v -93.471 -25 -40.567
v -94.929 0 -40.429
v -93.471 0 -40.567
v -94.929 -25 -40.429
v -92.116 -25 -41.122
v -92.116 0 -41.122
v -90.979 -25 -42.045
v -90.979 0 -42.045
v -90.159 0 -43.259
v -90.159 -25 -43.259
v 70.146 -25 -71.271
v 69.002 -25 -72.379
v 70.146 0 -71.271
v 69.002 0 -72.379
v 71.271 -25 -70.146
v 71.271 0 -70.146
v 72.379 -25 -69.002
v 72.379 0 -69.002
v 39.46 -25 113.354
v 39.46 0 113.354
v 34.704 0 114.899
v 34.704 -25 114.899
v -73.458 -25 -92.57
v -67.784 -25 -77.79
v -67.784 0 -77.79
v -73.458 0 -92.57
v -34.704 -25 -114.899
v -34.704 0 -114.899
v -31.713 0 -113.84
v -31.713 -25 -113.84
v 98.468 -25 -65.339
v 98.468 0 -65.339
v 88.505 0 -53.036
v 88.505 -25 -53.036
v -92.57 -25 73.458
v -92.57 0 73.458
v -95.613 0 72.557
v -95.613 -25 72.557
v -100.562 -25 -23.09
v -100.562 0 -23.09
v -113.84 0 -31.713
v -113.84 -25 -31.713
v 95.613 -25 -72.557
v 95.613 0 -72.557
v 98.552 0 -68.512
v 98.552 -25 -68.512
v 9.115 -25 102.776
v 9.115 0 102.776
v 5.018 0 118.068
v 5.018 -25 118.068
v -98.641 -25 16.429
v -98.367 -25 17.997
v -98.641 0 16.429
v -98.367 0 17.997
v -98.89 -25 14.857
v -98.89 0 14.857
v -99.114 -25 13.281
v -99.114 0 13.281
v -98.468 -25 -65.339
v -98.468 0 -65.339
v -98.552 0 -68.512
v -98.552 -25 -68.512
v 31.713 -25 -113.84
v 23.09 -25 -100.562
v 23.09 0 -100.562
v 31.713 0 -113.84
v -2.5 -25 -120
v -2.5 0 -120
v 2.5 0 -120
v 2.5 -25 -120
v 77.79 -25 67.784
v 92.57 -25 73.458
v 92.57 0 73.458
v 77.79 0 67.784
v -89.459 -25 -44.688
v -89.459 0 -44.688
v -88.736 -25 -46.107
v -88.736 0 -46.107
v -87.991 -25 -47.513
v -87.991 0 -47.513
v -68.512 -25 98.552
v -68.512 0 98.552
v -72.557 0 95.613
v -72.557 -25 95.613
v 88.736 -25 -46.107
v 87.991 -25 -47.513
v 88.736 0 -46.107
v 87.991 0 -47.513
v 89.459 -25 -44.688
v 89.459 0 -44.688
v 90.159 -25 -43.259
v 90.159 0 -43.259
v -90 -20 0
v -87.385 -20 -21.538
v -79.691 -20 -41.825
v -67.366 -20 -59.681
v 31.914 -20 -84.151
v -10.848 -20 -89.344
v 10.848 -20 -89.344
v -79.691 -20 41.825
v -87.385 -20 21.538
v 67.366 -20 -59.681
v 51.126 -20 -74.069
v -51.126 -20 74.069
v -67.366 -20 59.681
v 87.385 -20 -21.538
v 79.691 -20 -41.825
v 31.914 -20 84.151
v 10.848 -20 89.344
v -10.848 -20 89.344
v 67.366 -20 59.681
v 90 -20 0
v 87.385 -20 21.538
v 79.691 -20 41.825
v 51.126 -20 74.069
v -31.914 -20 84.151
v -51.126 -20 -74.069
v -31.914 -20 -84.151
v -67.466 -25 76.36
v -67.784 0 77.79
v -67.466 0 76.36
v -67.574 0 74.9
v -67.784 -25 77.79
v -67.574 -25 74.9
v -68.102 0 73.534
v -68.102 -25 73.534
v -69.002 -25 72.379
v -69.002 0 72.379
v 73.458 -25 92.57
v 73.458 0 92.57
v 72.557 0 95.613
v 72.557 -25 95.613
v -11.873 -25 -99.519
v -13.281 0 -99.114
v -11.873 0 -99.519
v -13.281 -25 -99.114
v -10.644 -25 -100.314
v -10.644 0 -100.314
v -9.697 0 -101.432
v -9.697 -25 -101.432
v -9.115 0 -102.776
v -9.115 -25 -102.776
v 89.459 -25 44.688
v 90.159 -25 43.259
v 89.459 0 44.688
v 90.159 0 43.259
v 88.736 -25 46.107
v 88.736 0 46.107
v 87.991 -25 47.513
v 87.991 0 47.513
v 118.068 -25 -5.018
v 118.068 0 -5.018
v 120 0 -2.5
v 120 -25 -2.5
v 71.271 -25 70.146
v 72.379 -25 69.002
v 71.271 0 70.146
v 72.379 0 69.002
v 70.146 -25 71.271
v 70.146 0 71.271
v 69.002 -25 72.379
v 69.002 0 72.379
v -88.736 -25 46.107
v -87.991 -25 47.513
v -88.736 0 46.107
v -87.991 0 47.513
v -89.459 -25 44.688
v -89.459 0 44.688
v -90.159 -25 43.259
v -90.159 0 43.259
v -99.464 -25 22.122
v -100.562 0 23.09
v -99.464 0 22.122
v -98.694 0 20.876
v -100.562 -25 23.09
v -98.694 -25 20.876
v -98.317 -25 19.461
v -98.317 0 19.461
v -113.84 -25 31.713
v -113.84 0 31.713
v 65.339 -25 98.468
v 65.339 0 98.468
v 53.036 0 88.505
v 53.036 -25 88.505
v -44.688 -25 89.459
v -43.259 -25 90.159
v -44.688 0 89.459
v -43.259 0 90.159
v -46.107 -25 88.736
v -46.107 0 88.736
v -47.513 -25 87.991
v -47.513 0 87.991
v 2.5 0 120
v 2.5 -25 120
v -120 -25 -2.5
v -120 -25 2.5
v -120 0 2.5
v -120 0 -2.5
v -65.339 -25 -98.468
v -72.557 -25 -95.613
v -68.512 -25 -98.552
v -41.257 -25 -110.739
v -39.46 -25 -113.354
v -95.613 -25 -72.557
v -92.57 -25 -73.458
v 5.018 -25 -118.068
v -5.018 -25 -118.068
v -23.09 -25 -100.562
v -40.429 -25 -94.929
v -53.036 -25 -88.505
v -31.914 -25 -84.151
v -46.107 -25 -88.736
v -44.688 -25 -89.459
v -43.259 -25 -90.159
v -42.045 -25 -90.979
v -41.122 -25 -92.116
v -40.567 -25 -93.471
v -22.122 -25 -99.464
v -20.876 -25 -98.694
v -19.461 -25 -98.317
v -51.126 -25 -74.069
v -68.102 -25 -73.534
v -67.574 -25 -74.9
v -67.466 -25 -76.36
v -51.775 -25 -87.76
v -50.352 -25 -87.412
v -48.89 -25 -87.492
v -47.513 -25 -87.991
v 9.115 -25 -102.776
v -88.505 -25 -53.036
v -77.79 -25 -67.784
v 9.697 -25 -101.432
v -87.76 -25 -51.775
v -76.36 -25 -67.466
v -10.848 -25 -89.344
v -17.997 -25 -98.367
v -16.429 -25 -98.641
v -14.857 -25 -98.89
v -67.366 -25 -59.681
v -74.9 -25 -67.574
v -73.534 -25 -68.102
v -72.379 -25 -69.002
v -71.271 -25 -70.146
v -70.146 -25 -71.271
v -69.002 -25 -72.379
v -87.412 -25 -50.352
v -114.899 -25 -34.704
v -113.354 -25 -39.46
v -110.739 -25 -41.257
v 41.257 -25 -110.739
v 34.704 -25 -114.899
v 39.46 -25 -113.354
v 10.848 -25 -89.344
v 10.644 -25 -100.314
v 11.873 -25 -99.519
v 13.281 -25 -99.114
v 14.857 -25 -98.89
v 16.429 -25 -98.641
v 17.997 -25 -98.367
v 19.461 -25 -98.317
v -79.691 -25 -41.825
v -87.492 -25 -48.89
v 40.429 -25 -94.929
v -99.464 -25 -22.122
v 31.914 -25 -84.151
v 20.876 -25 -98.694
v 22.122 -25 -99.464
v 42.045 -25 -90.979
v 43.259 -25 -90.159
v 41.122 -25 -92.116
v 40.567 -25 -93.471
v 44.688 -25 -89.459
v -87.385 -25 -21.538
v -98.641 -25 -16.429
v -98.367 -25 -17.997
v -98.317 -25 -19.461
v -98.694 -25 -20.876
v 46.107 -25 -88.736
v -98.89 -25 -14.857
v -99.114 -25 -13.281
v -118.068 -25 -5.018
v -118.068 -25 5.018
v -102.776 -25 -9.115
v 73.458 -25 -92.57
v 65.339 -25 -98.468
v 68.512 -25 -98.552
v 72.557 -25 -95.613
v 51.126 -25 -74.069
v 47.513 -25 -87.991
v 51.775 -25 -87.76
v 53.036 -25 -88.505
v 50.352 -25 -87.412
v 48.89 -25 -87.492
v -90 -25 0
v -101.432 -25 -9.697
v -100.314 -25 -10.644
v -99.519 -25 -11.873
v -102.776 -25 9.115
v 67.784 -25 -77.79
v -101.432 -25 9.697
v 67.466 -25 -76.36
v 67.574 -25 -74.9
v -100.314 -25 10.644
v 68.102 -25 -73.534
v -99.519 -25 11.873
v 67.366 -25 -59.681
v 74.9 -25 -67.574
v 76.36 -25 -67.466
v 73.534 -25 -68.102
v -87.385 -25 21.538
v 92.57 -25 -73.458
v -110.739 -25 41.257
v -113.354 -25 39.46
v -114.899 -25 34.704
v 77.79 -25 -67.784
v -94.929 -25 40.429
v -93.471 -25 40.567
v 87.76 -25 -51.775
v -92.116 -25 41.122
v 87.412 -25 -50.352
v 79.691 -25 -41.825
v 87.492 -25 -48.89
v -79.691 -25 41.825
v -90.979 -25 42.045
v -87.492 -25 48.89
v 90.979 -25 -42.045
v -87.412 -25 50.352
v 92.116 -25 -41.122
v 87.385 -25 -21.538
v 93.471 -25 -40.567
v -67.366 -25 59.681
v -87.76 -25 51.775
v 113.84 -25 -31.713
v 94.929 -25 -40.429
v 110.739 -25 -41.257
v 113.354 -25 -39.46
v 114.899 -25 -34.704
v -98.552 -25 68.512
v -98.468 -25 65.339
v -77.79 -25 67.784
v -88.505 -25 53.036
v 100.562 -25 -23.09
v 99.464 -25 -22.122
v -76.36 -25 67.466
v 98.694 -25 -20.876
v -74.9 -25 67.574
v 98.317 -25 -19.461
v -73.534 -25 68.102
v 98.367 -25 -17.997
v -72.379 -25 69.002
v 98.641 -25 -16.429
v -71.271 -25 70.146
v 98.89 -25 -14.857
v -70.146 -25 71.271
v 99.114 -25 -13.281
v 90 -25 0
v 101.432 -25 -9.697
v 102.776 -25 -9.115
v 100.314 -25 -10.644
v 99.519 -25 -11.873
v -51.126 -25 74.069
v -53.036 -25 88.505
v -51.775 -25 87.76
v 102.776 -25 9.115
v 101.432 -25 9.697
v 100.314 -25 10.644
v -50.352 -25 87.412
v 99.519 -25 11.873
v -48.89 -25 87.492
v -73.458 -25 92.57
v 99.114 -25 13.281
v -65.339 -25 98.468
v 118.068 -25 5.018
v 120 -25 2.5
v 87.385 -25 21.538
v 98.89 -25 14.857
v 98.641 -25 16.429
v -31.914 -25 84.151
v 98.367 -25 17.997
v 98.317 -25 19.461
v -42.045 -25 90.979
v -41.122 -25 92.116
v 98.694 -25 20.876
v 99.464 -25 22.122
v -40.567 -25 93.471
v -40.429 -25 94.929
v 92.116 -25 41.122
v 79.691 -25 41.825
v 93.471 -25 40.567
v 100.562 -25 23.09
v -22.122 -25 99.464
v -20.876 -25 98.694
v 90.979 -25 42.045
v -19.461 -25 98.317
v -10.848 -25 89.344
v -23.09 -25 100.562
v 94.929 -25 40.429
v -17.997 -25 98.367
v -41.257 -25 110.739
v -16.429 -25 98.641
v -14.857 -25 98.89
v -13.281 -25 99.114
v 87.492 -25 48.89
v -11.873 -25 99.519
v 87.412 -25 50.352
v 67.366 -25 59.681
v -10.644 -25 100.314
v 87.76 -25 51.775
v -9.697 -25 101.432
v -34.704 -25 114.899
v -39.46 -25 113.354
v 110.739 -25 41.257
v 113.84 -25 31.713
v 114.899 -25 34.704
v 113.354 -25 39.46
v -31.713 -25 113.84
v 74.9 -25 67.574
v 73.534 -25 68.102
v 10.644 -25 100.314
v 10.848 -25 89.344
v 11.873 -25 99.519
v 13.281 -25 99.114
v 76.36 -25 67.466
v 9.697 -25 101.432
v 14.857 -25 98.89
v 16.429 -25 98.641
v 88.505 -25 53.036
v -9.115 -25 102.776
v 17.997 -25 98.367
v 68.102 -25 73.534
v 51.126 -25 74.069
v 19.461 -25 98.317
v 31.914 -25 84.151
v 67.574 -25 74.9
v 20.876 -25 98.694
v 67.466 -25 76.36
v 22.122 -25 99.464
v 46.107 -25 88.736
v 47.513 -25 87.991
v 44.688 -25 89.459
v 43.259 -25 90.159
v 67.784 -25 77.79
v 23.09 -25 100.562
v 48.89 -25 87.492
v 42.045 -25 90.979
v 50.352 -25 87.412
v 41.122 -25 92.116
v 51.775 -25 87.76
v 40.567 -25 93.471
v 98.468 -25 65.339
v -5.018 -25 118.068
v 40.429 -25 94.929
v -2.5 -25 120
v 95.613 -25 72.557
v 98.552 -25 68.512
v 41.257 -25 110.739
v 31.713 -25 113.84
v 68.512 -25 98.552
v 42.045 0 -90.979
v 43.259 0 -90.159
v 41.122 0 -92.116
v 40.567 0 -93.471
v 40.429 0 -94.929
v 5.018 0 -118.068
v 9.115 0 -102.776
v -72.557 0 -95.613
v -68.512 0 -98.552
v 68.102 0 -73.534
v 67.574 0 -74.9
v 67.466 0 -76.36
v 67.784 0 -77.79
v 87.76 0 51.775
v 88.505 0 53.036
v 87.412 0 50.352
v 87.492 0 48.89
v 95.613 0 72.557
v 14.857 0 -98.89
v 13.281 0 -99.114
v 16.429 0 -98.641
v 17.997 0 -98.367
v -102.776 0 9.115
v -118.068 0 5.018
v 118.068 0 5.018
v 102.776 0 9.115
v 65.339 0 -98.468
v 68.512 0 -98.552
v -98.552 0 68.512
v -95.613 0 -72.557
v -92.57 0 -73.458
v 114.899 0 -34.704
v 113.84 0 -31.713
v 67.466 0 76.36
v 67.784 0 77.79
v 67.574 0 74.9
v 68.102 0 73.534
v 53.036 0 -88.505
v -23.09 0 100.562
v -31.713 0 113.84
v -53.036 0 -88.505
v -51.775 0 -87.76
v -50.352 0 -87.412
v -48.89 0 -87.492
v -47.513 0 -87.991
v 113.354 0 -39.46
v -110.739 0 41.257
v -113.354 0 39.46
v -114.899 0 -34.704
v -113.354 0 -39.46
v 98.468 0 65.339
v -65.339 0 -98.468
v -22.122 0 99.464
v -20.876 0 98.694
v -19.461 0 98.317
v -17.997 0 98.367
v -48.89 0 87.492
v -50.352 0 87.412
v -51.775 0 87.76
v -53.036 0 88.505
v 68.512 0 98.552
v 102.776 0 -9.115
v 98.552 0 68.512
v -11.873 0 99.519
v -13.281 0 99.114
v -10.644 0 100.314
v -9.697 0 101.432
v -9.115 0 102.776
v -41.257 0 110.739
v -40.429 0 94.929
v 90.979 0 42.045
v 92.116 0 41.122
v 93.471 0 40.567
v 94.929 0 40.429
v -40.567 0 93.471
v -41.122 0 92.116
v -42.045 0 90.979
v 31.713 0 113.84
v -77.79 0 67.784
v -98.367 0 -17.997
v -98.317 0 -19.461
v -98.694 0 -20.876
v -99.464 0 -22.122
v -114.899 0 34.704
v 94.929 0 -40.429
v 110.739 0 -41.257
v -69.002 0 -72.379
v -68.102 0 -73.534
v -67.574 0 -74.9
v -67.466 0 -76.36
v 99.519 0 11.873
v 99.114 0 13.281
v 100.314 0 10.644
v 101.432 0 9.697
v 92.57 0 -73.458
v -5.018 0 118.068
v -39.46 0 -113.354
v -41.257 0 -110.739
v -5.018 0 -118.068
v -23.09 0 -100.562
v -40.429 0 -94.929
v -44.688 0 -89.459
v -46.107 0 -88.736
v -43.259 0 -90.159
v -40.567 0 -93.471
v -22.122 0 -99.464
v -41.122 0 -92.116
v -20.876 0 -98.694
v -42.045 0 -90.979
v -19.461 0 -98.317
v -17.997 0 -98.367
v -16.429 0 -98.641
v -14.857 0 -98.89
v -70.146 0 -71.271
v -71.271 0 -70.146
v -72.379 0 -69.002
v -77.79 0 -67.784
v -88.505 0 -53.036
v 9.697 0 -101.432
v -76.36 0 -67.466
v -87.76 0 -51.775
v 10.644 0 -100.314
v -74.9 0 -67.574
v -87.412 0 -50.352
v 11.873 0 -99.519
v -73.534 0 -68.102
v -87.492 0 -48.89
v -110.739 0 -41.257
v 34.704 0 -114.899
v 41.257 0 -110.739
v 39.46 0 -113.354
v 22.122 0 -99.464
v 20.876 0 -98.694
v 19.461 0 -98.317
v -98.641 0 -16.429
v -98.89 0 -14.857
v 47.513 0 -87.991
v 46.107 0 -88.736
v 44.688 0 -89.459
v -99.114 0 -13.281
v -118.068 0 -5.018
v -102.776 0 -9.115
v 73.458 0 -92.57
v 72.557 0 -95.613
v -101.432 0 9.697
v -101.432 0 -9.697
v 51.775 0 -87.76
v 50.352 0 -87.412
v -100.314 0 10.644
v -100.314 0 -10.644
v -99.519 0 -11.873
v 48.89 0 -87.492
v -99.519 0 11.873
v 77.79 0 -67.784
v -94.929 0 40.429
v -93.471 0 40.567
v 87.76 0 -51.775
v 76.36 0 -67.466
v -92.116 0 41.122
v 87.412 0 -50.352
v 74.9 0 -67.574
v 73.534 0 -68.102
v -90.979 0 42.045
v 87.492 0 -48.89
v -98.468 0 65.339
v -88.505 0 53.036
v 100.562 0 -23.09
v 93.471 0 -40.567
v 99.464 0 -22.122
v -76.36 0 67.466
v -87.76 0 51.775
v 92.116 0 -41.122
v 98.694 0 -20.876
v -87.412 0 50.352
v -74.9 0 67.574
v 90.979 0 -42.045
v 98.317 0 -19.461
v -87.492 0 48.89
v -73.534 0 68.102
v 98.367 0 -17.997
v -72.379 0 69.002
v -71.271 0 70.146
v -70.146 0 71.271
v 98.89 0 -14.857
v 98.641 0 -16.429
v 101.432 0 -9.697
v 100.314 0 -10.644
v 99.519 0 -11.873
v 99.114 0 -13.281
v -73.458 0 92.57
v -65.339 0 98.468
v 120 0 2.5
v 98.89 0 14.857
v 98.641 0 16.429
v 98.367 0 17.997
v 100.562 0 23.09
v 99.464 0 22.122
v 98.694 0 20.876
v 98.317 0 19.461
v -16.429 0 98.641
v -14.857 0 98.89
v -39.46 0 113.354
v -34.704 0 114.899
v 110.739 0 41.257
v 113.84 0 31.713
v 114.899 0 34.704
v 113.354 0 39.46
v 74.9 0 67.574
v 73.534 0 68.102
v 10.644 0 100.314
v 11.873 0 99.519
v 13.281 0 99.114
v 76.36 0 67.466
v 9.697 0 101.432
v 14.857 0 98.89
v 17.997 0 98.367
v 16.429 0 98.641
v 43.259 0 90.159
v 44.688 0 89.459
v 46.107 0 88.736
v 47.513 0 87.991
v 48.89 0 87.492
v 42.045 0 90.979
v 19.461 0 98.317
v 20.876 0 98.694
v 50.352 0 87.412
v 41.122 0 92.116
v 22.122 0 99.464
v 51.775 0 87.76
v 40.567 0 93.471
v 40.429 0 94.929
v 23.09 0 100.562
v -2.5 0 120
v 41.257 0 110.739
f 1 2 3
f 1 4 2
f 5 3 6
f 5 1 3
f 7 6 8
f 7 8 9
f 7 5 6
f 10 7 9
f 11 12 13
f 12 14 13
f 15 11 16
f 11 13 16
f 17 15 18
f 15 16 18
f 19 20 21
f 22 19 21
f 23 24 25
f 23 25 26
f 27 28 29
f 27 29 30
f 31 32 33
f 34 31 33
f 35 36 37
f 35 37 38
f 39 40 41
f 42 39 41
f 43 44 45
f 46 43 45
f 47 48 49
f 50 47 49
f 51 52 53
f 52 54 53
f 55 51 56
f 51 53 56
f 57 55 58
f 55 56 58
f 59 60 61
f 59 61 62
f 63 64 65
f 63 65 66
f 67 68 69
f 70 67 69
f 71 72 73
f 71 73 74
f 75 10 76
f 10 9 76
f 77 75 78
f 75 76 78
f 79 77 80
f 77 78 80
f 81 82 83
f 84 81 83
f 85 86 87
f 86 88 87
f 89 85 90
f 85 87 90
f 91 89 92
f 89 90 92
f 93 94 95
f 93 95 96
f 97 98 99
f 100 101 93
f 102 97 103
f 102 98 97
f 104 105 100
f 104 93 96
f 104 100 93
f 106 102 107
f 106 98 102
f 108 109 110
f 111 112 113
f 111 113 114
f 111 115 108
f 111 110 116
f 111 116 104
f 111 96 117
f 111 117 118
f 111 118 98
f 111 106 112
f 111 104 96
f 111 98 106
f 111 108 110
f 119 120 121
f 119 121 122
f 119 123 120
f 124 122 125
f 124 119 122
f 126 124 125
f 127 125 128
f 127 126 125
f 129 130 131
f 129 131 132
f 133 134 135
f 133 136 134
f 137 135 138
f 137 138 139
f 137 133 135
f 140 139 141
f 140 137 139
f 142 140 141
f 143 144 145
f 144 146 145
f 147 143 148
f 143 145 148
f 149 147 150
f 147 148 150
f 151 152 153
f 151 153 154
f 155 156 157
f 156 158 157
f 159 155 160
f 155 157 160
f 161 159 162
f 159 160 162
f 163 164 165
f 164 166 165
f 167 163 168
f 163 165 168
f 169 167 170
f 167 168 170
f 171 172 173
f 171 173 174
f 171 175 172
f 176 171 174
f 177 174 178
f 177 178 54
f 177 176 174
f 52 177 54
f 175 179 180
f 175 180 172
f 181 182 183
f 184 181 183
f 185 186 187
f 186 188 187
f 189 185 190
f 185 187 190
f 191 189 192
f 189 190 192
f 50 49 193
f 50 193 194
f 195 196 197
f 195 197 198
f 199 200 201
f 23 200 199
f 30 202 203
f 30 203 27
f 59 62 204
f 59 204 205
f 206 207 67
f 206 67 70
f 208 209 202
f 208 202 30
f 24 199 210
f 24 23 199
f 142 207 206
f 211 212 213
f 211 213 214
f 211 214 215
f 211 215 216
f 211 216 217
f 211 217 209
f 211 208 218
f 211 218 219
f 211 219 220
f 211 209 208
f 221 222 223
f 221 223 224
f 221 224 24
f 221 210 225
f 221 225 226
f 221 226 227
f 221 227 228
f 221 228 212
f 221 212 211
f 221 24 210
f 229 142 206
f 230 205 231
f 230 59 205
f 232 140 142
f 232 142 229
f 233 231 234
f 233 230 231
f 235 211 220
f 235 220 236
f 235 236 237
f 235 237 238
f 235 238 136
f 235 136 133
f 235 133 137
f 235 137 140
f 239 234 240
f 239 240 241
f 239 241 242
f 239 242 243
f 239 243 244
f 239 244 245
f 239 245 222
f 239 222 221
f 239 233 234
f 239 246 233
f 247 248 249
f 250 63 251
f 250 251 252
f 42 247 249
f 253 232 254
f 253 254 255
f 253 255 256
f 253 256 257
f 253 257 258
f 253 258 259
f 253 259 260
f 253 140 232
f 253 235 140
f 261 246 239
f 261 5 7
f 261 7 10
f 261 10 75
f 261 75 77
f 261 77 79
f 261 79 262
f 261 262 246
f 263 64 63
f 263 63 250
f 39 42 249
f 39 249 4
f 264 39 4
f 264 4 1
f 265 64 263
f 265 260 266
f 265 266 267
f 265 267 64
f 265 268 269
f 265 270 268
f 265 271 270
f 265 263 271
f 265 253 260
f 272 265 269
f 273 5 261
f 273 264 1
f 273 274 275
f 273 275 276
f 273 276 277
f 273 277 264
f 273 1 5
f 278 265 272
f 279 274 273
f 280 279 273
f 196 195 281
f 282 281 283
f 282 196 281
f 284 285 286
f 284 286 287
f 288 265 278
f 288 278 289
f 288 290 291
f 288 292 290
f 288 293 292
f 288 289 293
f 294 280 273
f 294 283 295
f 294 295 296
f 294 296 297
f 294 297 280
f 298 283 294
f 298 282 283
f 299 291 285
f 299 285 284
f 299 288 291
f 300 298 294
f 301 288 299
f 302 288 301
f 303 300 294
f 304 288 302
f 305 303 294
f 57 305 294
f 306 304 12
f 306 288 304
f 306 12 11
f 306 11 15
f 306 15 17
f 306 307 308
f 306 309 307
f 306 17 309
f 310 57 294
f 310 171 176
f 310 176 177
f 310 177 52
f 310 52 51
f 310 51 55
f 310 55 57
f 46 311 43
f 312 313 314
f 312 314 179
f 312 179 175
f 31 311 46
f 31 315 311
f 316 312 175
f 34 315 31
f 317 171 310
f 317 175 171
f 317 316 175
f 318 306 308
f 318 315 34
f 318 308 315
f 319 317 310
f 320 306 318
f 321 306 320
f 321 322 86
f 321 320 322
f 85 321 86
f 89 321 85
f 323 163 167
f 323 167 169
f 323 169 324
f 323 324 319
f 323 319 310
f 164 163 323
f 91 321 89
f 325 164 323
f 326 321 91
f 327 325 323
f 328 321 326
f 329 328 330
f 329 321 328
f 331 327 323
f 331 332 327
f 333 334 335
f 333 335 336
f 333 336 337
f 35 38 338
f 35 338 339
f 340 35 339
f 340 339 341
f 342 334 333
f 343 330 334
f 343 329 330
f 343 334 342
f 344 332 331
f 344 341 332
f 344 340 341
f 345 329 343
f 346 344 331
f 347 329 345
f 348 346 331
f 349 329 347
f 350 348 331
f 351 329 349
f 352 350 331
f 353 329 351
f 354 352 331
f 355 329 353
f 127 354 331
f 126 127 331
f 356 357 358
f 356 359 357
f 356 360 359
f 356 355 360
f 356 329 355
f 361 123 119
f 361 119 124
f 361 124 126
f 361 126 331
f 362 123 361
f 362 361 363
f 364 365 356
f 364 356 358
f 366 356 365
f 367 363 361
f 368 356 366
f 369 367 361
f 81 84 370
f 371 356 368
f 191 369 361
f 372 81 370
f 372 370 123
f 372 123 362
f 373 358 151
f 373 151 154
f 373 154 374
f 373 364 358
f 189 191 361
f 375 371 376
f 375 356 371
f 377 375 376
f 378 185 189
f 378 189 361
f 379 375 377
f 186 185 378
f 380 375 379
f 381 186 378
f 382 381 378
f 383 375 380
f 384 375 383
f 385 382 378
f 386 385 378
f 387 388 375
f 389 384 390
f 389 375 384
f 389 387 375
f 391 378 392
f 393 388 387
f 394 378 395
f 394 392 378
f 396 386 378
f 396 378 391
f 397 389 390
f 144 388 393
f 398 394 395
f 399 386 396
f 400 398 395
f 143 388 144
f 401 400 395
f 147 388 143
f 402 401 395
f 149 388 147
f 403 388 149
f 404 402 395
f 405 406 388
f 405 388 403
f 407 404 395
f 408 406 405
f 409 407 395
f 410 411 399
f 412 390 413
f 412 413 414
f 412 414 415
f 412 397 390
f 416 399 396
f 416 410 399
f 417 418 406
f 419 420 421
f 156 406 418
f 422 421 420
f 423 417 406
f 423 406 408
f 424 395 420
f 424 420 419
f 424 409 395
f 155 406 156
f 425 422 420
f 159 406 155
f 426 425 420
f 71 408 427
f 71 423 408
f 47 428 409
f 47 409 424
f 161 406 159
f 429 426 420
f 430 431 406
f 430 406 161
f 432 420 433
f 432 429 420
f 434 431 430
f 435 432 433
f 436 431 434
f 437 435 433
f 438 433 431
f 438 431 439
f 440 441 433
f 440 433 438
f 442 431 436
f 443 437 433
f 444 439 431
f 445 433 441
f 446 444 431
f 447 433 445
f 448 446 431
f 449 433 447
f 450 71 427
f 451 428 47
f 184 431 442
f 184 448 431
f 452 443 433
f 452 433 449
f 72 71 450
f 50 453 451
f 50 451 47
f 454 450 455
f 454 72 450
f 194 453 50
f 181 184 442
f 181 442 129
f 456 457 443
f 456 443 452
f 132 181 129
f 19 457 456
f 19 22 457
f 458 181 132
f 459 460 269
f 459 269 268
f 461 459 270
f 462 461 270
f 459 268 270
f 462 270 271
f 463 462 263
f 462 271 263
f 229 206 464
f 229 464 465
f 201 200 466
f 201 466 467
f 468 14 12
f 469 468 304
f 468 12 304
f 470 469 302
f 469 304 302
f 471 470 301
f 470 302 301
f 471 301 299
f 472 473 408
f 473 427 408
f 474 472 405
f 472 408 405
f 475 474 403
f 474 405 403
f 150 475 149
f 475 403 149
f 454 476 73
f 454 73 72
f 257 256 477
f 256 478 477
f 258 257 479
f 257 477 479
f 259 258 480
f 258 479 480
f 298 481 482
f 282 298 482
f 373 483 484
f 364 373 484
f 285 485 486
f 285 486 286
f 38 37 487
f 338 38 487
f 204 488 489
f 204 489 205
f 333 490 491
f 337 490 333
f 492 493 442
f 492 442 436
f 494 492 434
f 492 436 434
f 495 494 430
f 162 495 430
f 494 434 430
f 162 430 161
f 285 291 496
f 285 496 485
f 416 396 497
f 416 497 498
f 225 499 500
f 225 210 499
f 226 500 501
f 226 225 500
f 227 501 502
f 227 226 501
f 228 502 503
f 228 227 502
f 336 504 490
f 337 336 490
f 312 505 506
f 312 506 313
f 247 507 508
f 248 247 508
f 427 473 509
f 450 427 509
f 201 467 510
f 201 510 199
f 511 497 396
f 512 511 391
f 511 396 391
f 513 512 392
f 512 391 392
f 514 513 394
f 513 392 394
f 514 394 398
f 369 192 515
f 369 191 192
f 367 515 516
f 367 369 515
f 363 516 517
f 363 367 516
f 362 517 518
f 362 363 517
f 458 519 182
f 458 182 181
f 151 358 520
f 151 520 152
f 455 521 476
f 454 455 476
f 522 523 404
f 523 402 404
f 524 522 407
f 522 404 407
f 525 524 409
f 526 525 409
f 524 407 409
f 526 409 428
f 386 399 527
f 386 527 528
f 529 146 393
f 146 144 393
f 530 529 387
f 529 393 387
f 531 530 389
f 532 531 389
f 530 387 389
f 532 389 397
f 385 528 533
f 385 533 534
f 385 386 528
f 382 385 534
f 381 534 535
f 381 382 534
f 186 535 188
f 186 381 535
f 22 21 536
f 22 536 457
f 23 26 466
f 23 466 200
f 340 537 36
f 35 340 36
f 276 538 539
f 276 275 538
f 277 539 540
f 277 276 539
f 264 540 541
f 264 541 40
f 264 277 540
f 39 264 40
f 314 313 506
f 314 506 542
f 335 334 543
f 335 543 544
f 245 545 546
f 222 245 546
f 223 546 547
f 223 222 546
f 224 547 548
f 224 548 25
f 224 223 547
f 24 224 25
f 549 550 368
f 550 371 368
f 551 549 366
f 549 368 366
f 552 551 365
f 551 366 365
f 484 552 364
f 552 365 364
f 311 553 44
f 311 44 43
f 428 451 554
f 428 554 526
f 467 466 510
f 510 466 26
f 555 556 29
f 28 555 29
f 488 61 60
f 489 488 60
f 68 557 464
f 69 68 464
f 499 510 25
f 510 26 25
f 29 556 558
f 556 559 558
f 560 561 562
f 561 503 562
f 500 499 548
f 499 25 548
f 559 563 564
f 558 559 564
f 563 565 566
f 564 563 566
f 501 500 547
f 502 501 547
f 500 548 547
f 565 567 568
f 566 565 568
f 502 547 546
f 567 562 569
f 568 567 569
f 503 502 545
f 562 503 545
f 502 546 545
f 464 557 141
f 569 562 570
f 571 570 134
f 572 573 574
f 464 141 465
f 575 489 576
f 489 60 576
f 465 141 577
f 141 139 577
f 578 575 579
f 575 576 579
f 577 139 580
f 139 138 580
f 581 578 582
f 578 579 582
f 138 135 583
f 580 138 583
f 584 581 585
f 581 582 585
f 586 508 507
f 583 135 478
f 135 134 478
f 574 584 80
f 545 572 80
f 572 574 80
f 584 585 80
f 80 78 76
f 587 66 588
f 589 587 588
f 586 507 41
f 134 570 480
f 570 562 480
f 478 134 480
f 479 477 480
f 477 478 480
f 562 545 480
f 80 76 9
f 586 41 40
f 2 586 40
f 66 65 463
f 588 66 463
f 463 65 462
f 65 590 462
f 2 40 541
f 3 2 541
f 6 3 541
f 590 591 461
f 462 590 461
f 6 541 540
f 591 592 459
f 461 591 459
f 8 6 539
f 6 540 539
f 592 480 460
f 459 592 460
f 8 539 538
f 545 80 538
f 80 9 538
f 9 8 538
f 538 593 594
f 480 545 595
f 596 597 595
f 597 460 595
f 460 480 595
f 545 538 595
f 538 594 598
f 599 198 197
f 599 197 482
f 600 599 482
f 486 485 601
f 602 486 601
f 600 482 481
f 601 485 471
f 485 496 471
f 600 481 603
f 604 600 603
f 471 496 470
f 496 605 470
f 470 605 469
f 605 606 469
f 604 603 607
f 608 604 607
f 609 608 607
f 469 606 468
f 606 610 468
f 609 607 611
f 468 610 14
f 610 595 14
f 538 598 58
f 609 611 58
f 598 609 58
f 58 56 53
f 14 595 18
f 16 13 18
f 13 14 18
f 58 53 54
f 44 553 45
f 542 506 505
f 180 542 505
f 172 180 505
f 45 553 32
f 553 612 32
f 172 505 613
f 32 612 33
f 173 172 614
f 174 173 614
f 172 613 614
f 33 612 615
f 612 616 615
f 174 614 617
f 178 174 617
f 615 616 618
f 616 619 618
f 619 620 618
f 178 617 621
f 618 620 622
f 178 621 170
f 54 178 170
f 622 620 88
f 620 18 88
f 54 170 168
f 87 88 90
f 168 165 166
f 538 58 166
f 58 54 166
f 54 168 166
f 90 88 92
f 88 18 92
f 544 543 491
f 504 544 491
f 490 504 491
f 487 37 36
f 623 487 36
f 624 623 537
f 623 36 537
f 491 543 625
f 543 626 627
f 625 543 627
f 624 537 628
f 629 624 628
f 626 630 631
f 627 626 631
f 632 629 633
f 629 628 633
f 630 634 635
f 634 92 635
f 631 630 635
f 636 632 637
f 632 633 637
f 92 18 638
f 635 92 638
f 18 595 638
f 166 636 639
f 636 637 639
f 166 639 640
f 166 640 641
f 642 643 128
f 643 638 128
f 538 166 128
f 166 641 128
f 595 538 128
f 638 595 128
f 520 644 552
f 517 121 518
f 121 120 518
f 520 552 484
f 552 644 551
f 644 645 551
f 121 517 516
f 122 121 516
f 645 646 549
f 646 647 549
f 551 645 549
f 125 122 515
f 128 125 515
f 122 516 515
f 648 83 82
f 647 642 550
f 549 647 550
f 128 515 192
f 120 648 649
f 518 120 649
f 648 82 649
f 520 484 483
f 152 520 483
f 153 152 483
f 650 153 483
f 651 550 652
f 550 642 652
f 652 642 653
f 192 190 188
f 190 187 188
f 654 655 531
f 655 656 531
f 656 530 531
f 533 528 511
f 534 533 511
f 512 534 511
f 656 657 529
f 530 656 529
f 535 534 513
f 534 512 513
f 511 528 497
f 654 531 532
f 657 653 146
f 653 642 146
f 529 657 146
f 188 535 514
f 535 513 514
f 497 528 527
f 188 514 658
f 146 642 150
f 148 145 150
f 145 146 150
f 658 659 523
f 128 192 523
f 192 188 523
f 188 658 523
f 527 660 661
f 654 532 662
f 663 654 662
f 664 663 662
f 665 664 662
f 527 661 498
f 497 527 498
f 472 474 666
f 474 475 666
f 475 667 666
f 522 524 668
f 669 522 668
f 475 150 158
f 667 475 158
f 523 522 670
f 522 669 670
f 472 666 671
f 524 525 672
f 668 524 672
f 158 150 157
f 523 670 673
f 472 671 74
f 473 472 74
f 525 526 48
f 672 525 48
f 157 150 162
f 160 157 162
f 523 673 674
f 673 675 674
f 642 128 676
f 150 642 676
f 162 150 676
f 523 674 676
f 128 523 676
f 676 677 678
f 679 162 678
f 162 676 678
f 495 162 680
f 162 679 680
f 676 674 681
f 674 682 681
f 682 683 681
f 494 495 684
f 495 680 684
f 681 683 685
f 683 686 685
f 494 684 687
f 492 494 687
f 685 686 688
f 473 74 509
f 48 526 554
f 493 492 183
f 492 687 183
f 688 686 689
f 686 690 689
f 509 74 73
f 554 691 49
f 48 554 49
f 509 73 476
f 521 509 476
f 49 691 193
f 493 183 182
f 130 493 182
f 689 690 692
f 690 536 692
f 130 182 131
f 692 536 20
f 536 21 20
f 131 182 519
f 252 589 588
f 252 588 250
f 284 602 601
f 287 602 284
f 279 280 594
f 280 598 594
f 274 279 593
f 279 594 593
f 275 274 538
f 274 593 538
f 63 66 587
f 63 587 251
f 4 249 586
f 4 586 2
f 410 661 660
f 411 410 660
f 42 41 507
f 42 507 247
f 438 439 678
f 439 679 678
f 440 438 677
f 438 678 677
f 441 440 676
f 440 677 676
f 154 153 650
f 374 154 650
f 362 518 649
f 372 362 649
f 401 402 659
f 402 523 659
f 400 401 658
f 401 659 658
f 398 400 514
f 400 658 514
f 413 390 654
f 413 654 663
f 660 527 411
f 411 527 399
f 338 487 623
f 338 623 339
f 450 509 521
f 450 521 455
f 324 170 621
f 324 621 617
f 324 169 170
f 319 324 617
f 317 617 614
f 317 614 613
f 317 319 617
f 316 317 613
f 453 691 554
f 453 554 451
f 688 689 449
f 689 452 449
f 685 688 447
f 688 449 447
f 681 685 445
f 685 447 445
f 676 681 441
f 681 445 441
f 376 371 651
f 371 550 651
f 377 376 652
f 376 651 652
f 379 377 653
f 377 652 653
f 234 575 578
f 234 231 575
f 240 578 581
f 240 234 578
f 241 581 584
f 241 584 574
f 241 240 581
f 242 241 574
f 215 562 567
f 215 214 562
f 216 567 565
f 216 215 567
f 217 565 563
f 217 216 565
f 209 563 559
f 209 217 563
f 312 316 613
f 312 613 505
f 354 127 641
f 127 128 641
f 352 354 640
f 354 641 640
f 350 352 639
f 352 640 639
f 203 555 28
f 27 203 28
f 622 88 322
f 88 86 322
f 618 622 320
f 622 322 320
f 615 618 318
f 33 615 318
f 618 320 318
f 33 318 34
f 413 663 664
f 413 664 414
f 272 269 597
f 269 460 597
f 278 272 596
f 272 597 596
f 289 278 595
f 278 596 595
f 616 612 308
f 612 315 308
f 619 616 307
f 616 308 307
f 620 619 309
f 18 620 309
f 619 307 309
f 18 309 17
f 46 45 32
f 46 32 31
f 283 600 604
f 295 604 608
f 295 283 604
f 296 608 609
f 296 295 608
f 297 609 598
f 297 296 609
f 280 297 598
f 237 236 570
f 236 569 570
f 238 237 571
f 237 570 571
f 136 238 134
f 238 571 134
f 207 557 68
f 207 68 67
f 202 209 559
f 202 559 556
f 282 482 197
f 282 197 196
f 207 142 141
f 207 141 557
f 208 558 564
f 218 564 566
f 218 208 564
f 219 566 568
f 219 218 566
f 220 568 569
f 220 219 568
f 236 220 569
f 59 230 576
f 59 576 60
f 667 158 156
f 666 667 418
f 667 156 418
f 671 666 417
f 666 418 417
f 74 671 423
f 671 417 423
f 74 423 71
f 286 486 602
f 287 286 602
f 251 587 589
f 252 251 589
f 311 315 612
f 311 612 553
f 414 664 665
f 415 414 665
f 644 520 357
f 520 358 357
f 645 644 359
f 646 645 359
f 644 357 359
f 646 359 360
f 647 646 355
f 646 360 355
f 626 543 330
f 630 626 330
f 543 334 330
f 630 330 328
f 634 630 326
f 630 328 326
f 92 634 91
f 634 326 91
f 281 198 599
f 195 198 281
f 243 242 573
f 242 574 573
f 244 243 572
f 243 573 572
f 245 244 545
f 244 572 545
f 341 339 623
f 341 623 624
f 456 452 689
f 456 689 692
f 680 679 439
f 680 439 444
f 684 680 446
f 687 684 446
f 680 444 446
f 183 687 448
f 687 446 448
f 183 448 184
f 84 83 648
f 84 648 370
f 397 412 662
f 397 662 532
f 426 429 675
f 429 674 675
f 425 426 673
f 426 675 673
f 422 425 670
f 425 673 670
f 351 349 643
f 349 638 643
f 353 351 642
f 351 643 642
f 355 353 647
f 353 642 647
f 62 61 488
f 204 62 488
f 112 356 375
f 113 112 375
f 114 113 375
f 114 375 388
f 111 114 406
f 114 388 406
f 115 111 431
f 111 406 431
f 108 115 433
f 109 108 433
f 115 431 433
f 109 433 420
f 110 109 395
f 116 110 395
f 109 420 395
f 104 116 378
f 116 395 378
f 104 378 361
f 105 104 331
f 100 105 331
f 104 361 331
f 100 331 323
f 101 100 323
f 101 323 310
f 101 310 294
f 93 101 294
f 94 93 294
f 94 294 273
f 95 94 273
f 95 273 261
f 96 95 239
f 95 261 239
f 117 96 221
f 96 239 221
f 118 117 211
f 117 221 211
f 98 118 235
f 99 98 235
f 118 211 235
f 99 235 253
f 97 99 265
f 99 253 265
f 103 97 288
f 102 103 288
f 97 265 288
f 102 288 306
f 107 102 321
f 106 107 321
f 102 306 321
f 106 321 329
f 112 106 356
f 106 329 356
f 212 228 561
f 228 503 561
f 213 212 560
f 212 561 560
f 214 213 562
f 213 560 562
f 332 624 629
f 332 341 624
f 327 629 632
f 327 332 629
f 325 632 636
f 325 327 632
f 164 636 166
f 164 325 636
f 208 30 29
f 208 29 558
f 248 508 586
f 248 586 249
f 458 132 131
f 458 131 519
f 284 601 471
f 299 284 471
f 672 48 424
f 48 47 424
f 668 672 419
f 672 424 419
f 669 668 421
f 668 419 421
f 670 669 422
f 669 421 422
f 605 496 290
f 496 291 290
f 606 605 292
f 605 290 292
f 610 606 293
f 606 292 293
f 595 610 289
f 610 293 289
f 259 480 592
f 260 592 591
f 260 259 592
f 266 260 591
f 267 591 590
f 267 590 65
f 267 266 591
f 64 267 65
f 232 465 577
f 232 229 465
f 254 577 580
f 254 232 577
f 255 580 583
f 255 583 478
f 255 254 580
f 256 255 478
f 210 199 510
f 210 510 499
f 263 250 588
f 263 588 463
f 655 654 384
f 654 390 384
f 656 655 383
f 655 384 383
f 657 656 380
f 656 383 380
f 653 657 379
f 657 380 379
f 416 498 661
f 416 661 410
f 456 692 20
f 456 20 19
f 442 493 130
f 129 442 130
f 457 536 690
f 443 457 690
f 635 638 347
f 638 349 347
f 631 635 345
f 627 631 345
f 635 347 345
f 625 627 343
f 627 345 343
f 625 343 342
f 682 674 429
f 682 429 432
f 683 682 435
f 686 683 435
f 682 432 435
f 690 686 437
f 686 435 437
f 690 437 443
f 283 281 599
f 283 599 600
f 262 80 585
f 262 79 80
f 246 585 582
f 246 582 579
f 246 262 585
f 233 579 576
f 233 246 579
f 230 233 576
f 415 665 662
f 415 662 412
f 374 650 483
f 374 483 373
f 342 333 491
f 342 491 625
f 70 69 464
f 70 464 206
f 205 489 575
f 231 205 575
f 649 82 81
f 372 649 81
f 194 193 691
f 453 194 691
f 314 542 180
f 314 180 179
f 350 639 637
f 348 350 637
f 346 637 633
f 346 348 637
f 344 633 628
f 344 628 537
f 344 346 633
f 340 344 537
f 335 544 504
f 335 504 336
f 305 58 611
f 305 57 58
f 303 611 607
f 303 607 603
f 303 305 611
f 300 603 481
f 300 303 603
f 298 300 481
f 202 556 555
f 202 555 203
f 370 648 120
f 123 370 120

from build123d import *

# Parameters (mm, degrees)
F0_R            = 100
F1_DEPTH        = 25
F3_DEPTH        = 25
F3_COPIES_COUNT = 20
F4_SIZE         = 2
F5_R            = 5
F6_R            = 90
F7_DEPTH        = 5


# Not quite as in the source:
# - a pattern or mirror of a feature is missing from the dataset's text; its kind, count and spacing are read off the source's solid


with BuildPart() as f1:
    # F0 (on Front) → F1 (new body)
    with BuildSketch(Plane.XZ):
        Circle(F0_R)
    extrude(amount=F1_DEPTH)

    # F2 (on Front) → F3 (join)
    with BuildSketch(Plane.XZ):
        Polygon((4.5, 120), (-4.5, 120), (-9.9931095726, 99.4994359837), (9.9931095726, 99.4994359837), align=None)
    f3 = extrude(amount=F3_DEPTH)

    # F3_copies: F3 ×20 about axis
    f3_copies_axis = Axis((0, 0, 0), (0, 1, 0))
    for i in range(1, F3_COPIES_COUNT):
        add(f3.rotate(f3_copies_axis, i * 360 / F3_COPIES_COUNT))

    # F4
    f4_edges = [f1.edges().sort_by_distance(p)[0] for p in [
        (4.5, -12.5, 120),
        (-4.5, -12.5, 120),
        (-32.802285, -12.5, 115.517358),
        (115.517358, -12.5, 32.802285),
        (120, -12.5, 4.5),
        (120, -12.5, -4.5),
        (115.517358, -12.5, -32.802285),
        (112.736205, -12.5, -41.361794),
        (99.727073, -12.5, -66.893654),
        (94.437006, -12.5, -74.174807),
        (74.174807, -12.5, -94.437006),
        (66.893654, -12.5, -99.727073),
        (41.361794, -12.5, -112.736205),
        (32.802285, -12.5, -115.517358),
        (4.5, -12.5, -120),
        (-4.5, -12.5, -120),
        (-32.802285, -12.5, -115.517358),
        (-41.361794, -12.5, -112.736205),
        (-66.893654, -12.5, -99.727073),
        (-74.174807, -12.5, -94.437006),
        (-94.437006, -12.5, -74.174807),
        (-99.727073, -12.5, -66.893654),
        (-112.736205, -12.5, -41.361794),
        (-115.517358, -12.5, -32.802285),
        (-120, -12.5, -4.5),
        (-120, -12.5, 4.5),
        (-115.517358, -12.5, 32.802285),
        (-112.736205, -12.5, 41.361794),
        (-99.727073, -12.5, 66.893654),
        (-94.437006, -12.5, 74.174807),
        (-74.174807, -12.5, 94.437006),
        (-66.893654, -12.5, 99.727073),
        (32.802285, -12.5, 115.517358),
        (41.361794, -12.5, 112.736205),
        (66.893654, -12.5, 99.727073),
        (74.174807, -12.5, 94.437006),
        (94.437006, -12.5, 74.174807),
        (99.727073, -12.5, 66.893654),
        (112.736205, -12.5, 41.361794),
        (-41.361794, -12.5, 112.736205),
    ]]
    chamfer(f4_edges, length=F4_SIZE)

    # F5
    f5_edges = [f1.edges().sort_by_distance(p)[0] for p in [
        (9.99311, -12.5, 99.499436),
        (-9.99311, -12.5, 99.499436),
        (97.717628, -12.5, 21.243005),
        (99.499436, -12.5, 9.99311),
        (91.541546, -12.5, 40.251029),
        (86.370537, -12.5, 50.399706),
        (99.499436, -12.5, -9.99311),
        (97.717628, -12.5, -21.243005),
        (74.622932, -12.5, 66.568897),
        (66.568897, -12.5, 74.622932),
        (91.541546, -12.5, -40.251029),
        (86.370537, -12.5, -50.399706),
        (50.399706, -12.5, 86.370537),
        (40.251029, -12.5, 91.541546),
        (74.622932, -12.5, -66.568897),
        (66.568897, -12.5, -74.622932),
        (21.243005, -12.5, 97.717628),
        (50.399706, -12.5, -86.370537),
        (40.251029, -12.5, -91.541546),
        (-21.243005, -12.5, 97.717628),
        (21.243005, -12.5, -97.717628),
        (9.99311, -12.5, -99.499436),
        (-40.251029, -12.5, 91.541546),
        (-50.399706, -12.5, 86.370537),
        (-9.99311, -12.5, -99.499436),
        (-21.243005, -12.5, -97.717628),
        (-66.568897, -12.5, 74.622932),
        (-74.622932, -12.5, 66.568897),
        (-40.251029, -12.5, -91.541546),
        (-50.399706, -12.5, -86.370537),
        (-86.370537, -12.5, 50.399706),
        (-91.541546, -12.5, 40.251029),
        (-66.568897, -12.5, -74.622932),
        (-74.622932, -12.5, -66.568897),
        (-97.717628, -12.5, 21.243005),
        (-99.499436, -12.5, 9.99311),
        (-86.370537, -12.5, -50.399706),
        (-91.541546, -12.5, -40.251029),
        (-99.499436, -12.5, -9.99311),
        (-97.717628, -12.5, -21.243005),
    ]]
    fillet(f5_edges, radius=F5_R)

    # F6 (on face) → F7 (cut)
    with BuildSketch(Plane.XZ.offset(25)):
        Circle(F6_R)
    extrude(amount=-F7_DEPTH, mode=Mode.SUBTRACT)


solid = f1.part
